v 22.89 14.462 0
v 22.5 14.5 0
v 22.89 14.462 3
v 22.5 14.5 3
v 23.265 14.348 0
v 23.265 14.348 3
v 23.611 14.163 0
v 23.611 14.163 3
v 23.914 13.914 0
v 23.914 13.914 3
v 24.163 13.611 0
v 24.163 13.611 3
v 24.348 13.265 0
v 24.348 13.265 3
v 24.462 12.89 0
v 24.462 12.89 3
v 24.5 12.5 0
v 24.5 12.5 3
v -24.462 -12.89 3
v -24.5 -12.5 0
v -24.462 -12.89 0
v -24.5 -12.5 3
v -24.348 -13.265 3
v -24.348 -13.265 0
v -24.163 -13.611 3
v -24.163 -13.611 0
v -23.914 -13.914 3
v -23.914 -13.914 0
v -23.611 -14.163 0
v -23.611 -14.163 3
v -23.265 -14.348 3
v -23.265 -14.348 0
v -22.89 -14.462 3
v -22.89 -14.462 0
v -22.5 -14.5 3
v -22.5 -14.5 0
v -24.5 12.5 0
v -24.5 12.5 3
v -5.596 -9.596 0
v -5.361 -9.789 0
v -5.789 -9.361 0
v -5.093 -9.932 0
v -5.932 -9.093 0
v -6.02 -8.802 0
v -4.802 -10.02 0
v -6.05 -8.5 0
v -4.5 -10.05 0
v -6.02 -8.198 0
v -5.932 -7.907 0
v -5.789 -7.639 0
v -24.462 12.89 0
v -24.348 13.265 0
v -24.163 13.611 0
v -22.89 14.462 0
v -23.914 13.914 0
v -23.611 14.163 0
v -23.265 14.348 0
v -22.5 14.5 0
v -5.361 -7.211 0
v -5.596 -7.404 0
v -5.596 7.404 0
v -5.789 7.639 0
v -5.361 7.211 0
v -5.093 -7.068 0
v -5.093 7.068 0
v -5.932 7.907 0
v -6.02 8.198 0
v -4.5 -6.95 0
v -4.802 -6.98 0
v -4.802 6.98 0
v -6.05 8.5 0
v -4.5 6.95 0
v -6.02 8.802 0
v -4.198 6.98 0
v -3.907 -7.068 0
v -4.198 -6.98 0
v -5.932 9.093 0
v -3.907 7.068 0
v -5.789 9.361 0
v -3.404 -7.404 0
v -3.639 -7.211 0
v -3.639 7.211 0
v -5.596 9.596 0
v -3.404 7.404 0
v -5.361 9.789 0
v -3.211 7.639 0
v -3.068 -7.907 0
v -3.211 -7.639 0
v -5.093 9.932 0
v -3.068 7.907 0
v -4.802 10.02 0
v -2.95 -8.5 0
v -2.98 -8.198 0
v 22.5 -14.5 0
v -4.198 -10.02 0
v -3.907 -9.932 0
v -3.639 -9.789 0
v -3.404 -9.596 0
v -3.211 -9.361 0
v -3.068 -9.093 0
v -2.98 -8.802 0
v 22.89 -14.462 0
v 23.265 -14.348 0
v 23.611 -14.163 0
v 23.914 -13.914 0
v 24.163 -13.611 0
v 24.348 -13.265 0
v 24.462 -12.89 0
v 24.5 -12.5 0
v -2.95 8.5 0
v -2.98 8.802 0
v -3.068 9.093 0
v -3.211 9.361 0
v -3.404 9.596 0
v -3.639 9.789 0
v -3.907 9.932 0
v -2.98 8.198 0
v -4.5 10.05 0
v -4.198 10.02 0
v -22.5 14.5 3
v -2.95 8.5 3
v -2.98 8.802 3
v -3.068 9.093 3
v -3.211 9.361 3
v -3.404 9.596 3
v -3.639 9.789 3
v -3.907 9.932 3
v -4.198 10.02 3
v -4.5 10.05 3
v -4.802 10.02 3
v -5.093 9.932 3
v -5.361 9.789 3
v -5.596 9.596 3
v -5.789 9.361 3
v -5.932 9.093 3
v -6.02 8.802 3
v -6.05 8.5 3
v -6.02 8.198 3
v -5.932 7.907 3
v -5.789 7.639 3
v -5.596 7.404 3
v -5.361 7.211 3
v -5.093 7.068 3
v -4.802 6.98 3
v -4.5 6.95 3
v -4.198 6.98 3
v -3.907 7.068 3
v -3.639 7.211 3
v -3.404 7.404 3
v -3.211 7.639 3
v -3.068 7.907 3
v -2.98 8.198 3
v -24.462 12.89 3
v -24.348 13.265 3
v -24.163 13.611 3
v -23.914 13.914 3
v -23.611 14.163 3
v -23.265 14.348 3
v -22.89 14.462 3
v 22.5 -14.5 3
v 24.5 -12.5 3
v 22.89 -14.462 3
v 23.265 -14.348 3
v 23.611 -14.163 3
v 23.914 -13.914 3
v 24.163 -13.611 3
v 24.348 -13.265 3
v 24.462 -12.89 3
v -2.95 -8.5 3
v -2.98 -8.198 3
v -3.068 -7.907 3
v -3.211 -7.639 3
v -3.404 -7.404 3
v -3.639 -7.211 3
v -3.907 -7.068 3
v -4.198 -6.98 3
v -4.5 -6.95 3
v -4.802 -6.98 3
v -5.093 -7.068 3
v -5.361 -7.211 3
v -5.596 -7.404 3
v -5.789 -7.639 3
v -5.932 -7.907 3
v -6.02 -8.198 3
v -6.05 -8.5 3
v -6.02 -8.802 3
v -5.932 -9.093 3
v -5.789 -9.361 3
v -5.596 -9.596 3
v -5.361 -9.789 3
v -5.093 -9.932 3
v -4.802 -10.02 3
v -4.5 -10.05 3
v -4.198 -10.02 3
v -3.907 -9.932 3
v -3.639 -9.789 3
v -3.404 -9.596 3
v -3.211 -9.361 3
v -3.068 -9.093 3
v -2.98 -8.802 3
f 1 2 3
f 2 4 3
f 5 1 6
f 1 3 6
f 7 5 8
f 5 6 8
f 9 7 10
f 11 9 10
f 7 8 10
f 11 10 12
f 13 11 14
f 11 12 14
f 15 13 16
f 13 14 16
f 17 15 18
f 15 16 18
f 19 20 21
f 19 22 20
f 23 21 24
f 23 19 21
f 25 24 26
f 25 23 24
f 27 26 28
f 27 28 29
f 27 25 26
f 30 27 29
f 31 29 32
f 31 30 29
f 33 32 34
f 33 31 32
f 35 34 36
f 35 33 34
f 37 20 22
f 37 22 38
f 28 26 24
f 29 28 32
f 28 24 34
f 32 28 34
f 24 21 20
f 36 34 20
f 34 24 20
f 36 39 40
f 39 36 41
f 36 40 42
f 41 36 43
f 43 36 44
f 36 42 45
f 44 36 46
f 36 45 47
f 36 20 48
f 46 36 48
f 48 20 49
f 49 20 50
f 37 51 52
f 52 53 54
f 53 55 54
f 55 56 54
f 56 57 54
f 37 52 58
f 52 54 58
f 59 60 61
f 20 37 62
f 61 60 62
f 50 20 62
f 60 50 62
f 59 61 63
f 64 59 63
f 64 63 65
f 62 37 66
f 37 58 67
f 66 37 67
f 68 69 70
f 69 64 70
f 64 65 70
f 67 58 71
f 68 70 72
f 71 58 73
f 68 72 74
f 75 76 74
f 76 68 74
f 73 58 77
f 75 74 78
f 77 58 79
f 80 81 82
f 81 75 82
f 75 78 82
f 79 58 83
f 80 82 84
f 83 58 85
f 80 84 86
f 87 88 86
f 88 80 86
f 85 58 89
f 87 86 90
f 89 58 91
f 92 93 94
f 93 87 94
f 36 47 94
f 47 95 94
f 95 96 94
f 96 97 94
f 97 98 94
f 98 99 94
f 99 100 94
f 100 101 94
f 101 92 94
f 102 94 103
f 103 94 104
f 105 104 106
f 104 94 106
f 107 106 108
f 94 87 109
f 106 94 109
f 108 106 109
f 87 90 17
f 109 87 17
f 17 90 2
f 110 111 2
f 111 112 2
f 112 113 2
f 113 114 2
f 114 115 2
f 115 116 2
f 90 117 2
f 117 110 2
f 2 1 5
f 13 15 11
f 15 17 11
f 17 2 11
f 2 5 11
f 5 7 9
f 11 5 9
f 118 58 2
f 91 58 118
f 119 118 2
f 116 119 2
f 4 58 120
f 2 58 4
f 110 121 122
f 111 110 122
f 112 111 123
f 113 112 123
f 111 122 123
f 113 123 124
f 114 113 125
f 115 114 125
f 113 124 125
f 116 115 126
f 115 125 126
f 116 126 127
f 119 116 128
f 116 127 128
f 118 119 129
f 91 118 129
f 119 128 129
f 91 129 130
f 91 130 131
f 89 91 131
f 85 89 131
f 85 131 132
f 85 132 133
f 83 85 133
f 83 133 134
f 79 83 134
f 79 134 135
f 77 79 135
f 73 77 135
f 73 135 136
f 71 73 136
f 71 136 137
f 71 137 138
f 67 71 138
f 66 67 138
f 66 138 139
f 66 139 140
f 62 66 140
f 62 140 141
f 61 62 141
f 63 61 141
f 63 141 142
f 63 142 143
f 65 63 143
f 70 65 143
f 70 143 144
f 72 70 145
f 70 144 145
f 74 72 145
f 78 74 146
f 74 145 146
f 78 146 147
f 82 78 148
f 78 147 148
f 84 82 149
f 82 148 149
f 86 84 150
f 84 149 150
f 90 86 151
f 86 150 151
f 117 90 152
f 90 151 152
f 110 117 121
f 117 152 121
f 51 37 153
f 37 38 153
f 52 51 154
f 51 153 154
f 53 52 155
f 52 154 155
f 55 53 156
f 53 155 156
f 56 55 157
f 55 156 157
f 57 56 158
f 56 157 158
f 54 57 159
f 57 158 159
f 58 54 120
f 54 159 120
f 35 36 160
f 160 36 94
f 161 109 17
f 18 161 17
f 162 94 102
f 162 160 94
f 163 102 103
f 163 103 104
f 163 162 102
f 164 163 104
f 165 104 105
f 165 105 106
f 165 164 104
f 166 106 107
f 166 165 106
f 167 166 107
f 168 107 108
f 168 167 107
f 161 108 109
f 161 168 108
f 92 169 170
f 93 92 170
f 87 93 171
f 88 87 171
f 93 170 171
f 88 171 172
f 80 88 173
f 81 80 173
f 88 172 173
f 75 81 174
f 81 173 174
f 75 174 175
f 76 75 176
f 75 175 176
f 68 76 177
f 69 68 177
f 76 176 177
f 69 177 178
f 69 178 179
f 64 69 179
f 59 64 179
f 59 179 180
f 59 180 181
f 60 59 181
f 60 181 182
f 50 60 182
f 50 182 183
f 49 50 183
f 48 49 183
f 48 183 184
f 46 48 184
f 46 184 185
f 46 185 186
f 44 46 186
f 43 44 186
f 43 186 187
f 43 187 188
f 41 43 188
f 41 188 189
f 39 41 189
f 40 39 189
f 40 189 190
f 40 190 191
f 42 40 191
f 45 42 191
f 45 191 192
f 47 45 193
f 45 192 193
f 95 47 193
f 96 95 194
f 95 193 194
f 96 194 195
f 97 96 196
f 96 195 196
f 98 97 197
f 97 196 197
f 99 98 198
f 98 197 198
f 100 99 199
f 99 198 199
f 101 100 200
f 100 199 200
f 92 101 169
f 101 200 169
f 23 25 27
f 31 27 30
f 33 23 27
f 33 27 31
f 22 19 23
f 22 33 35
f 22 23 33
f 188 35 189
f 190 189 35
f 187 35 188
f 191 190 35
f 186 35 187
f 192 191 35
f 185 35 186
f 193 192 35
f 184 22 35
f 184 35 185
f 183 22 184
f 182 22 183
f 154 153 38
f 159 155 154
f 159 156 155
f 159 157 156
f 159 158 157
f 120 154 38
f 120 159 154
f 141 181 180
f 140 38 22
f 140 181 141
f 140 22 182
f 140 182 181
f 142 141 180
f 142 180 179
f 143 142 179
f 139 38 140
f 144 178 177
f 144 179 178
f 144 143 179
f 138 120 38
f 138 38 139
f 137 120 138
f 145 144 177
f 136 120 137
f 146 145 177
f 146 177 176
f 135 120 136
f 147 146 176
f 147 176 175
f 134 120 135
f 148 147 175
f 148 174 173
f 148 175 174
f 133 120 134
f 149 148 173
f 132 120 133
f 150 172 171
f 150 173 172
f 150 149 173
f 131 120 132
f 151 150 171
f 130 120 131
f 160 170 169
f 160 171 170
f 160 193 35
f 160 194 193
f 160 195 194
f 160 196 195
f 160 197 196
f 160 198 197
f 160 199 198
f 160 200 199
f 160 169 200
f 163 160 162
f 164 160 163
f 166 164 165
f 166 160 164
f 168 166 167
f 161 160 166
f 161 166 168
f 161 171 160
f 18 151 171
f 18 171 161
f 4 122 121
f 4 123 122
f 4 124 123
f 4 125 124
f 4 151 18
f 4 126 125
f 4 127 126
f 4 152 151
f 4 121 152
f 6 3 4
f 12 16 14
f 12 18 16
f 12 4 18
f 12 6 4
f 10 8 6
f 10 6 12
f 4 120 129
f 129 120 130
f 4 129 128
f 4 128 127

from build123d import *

# Parameters (mm, degrees)
F0_W     = 49
F0_H     = 29
F1_DEPTH = 3
F2_R     = 1.55
F3_DEPTH = 25.4
F4_R     = 2


with BuildPart() as f1:
    # F0 (on Top) → F1 (new body)
    with BuildSketch(Plane.XY):
        Rectangle(F0_W, F0_H)
    extrude(amount=F1_DEPTH)

    # F2 (on face) → F3 (cut)
    with BuildSketch(Plane.XY.offset(3)):
        with Locations((-4.5, -8.5)):
            Circle(F2_R)
        with Locations((-4.5, 8.5)):
            Circle(F2_R)
    extrude(amount=-F3_DEPTH, mode=Mode.SUBTRACT)

    # F4
    f4_edges = [f1.edges().sort_by_distance(p)[0] for p in [
        (-24.5, 14.5, 1.5),
        (-24.5, -14.5, 1.5),
        (24.5, -14.5, 1.5),
        (24.5, 14.5, 1.5),
    ]]
    fillet(f4_edges, radius=F4_R)


solid = f1.part
